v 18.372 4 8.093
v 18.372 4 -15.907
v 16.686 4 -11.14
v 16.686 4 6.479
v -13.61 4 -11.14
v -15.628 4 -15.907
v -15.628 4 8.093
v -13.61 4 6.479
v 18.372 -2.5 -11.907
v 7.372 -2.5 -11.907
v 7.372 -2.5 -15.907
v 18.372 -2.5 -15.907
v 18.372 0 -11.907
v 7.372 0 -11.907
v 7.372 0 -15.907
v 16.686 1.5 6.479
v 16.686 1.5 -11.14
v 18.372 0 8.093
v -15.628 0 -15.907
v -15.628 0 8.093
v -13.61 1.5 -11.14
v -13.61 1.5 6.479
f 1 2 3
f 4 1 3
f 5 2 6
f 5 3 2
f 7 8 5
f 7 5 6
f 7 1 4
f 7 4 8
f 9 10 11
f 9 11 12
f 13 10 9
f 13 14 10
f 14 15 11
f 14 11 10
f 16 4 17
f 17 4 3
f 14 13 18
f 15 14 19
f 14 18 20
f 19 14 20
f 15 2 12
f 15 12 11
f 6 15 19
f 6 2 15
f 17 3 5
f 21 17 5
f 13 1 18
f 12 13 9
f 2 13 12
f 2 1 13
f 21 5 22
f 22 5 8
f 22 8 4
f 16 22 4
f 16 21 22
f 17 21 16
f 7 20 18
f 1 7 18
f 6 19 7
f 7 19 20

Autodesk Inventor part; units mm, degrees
ref_plane "YZ Plane" through (0, 0, 0) normal (1, 0, 0) x (0, 1, 0)
ref_plane "XZ Plane" through (0, 0, 0) normal (0, 1, 0) x (-1, 0, 0)
ref_plane "XY Plane" through (0, 0, 0) normal (0, 0, 1) x (1, 0, 0)
sketch "Sketch1" plane through (0, 0, 0) normal (0, 1, 0) x (-1, 0, 0)
  line L0 (15.6279, 8.093) -> (-18.3721, 8.093)
  line L1 (-18.3721, 8.093) -> (-18.3721, -15.907)
  line L2 (-18.3721, -15.907) -> (15.6279, -15.907)
  line L3 (15.6279, -15.907) -> (15.6279, 8.093)
  point P0 (0, 0)
  dimension "d0" = 24
  dimension "d1" = 34
extrude "Extrusion1" add sketch "Sketch1" along normal blind 4
sketch "Sketch2" plane through (0, 4, 0) normal (0, 1, 0) x (1, 0, 0)
  line L0 (-13.61, -6.4787) -> (16.6862, -6.4787)
  line L1 (16.6862, -6.4787) -> (16.6862, 11.1397)
  line L2 (16.6862, 11.1397) -> (-13.61, 11.1397)
  line L3 (-13.61, 11.1397) -> (-13.61, -6.4787)
  point P0 (0, 0)
extrude "Extrusion2" cut sketch "Sketch2" against normal blind 2.5
sketch "Sketch3" plane through (0, 0, 0) normal (0, -1, 0) x (1, 0, 0)
  line L0 (18.3721, -15.907) -> (-15.6279, -15.907) projected
  line L1 (18.3721, -15.907) -> (7.3721, -15.907)
  line L2 (7.3721, -15.907) -> (7.3721, -11.907)
  line L3 (7.3721, -11.907) -> (18.3721, -11.907)
  line L4 (18.3721, -11.907) -> (18.3721, -15.907)
  point P0 (0, 0)
  dimension "d6" = 11
  dimension "d7" = 4
extrude "Extrusion3" add sketch "Sketch3" along normal blind 2.5
properties part number "charger"
